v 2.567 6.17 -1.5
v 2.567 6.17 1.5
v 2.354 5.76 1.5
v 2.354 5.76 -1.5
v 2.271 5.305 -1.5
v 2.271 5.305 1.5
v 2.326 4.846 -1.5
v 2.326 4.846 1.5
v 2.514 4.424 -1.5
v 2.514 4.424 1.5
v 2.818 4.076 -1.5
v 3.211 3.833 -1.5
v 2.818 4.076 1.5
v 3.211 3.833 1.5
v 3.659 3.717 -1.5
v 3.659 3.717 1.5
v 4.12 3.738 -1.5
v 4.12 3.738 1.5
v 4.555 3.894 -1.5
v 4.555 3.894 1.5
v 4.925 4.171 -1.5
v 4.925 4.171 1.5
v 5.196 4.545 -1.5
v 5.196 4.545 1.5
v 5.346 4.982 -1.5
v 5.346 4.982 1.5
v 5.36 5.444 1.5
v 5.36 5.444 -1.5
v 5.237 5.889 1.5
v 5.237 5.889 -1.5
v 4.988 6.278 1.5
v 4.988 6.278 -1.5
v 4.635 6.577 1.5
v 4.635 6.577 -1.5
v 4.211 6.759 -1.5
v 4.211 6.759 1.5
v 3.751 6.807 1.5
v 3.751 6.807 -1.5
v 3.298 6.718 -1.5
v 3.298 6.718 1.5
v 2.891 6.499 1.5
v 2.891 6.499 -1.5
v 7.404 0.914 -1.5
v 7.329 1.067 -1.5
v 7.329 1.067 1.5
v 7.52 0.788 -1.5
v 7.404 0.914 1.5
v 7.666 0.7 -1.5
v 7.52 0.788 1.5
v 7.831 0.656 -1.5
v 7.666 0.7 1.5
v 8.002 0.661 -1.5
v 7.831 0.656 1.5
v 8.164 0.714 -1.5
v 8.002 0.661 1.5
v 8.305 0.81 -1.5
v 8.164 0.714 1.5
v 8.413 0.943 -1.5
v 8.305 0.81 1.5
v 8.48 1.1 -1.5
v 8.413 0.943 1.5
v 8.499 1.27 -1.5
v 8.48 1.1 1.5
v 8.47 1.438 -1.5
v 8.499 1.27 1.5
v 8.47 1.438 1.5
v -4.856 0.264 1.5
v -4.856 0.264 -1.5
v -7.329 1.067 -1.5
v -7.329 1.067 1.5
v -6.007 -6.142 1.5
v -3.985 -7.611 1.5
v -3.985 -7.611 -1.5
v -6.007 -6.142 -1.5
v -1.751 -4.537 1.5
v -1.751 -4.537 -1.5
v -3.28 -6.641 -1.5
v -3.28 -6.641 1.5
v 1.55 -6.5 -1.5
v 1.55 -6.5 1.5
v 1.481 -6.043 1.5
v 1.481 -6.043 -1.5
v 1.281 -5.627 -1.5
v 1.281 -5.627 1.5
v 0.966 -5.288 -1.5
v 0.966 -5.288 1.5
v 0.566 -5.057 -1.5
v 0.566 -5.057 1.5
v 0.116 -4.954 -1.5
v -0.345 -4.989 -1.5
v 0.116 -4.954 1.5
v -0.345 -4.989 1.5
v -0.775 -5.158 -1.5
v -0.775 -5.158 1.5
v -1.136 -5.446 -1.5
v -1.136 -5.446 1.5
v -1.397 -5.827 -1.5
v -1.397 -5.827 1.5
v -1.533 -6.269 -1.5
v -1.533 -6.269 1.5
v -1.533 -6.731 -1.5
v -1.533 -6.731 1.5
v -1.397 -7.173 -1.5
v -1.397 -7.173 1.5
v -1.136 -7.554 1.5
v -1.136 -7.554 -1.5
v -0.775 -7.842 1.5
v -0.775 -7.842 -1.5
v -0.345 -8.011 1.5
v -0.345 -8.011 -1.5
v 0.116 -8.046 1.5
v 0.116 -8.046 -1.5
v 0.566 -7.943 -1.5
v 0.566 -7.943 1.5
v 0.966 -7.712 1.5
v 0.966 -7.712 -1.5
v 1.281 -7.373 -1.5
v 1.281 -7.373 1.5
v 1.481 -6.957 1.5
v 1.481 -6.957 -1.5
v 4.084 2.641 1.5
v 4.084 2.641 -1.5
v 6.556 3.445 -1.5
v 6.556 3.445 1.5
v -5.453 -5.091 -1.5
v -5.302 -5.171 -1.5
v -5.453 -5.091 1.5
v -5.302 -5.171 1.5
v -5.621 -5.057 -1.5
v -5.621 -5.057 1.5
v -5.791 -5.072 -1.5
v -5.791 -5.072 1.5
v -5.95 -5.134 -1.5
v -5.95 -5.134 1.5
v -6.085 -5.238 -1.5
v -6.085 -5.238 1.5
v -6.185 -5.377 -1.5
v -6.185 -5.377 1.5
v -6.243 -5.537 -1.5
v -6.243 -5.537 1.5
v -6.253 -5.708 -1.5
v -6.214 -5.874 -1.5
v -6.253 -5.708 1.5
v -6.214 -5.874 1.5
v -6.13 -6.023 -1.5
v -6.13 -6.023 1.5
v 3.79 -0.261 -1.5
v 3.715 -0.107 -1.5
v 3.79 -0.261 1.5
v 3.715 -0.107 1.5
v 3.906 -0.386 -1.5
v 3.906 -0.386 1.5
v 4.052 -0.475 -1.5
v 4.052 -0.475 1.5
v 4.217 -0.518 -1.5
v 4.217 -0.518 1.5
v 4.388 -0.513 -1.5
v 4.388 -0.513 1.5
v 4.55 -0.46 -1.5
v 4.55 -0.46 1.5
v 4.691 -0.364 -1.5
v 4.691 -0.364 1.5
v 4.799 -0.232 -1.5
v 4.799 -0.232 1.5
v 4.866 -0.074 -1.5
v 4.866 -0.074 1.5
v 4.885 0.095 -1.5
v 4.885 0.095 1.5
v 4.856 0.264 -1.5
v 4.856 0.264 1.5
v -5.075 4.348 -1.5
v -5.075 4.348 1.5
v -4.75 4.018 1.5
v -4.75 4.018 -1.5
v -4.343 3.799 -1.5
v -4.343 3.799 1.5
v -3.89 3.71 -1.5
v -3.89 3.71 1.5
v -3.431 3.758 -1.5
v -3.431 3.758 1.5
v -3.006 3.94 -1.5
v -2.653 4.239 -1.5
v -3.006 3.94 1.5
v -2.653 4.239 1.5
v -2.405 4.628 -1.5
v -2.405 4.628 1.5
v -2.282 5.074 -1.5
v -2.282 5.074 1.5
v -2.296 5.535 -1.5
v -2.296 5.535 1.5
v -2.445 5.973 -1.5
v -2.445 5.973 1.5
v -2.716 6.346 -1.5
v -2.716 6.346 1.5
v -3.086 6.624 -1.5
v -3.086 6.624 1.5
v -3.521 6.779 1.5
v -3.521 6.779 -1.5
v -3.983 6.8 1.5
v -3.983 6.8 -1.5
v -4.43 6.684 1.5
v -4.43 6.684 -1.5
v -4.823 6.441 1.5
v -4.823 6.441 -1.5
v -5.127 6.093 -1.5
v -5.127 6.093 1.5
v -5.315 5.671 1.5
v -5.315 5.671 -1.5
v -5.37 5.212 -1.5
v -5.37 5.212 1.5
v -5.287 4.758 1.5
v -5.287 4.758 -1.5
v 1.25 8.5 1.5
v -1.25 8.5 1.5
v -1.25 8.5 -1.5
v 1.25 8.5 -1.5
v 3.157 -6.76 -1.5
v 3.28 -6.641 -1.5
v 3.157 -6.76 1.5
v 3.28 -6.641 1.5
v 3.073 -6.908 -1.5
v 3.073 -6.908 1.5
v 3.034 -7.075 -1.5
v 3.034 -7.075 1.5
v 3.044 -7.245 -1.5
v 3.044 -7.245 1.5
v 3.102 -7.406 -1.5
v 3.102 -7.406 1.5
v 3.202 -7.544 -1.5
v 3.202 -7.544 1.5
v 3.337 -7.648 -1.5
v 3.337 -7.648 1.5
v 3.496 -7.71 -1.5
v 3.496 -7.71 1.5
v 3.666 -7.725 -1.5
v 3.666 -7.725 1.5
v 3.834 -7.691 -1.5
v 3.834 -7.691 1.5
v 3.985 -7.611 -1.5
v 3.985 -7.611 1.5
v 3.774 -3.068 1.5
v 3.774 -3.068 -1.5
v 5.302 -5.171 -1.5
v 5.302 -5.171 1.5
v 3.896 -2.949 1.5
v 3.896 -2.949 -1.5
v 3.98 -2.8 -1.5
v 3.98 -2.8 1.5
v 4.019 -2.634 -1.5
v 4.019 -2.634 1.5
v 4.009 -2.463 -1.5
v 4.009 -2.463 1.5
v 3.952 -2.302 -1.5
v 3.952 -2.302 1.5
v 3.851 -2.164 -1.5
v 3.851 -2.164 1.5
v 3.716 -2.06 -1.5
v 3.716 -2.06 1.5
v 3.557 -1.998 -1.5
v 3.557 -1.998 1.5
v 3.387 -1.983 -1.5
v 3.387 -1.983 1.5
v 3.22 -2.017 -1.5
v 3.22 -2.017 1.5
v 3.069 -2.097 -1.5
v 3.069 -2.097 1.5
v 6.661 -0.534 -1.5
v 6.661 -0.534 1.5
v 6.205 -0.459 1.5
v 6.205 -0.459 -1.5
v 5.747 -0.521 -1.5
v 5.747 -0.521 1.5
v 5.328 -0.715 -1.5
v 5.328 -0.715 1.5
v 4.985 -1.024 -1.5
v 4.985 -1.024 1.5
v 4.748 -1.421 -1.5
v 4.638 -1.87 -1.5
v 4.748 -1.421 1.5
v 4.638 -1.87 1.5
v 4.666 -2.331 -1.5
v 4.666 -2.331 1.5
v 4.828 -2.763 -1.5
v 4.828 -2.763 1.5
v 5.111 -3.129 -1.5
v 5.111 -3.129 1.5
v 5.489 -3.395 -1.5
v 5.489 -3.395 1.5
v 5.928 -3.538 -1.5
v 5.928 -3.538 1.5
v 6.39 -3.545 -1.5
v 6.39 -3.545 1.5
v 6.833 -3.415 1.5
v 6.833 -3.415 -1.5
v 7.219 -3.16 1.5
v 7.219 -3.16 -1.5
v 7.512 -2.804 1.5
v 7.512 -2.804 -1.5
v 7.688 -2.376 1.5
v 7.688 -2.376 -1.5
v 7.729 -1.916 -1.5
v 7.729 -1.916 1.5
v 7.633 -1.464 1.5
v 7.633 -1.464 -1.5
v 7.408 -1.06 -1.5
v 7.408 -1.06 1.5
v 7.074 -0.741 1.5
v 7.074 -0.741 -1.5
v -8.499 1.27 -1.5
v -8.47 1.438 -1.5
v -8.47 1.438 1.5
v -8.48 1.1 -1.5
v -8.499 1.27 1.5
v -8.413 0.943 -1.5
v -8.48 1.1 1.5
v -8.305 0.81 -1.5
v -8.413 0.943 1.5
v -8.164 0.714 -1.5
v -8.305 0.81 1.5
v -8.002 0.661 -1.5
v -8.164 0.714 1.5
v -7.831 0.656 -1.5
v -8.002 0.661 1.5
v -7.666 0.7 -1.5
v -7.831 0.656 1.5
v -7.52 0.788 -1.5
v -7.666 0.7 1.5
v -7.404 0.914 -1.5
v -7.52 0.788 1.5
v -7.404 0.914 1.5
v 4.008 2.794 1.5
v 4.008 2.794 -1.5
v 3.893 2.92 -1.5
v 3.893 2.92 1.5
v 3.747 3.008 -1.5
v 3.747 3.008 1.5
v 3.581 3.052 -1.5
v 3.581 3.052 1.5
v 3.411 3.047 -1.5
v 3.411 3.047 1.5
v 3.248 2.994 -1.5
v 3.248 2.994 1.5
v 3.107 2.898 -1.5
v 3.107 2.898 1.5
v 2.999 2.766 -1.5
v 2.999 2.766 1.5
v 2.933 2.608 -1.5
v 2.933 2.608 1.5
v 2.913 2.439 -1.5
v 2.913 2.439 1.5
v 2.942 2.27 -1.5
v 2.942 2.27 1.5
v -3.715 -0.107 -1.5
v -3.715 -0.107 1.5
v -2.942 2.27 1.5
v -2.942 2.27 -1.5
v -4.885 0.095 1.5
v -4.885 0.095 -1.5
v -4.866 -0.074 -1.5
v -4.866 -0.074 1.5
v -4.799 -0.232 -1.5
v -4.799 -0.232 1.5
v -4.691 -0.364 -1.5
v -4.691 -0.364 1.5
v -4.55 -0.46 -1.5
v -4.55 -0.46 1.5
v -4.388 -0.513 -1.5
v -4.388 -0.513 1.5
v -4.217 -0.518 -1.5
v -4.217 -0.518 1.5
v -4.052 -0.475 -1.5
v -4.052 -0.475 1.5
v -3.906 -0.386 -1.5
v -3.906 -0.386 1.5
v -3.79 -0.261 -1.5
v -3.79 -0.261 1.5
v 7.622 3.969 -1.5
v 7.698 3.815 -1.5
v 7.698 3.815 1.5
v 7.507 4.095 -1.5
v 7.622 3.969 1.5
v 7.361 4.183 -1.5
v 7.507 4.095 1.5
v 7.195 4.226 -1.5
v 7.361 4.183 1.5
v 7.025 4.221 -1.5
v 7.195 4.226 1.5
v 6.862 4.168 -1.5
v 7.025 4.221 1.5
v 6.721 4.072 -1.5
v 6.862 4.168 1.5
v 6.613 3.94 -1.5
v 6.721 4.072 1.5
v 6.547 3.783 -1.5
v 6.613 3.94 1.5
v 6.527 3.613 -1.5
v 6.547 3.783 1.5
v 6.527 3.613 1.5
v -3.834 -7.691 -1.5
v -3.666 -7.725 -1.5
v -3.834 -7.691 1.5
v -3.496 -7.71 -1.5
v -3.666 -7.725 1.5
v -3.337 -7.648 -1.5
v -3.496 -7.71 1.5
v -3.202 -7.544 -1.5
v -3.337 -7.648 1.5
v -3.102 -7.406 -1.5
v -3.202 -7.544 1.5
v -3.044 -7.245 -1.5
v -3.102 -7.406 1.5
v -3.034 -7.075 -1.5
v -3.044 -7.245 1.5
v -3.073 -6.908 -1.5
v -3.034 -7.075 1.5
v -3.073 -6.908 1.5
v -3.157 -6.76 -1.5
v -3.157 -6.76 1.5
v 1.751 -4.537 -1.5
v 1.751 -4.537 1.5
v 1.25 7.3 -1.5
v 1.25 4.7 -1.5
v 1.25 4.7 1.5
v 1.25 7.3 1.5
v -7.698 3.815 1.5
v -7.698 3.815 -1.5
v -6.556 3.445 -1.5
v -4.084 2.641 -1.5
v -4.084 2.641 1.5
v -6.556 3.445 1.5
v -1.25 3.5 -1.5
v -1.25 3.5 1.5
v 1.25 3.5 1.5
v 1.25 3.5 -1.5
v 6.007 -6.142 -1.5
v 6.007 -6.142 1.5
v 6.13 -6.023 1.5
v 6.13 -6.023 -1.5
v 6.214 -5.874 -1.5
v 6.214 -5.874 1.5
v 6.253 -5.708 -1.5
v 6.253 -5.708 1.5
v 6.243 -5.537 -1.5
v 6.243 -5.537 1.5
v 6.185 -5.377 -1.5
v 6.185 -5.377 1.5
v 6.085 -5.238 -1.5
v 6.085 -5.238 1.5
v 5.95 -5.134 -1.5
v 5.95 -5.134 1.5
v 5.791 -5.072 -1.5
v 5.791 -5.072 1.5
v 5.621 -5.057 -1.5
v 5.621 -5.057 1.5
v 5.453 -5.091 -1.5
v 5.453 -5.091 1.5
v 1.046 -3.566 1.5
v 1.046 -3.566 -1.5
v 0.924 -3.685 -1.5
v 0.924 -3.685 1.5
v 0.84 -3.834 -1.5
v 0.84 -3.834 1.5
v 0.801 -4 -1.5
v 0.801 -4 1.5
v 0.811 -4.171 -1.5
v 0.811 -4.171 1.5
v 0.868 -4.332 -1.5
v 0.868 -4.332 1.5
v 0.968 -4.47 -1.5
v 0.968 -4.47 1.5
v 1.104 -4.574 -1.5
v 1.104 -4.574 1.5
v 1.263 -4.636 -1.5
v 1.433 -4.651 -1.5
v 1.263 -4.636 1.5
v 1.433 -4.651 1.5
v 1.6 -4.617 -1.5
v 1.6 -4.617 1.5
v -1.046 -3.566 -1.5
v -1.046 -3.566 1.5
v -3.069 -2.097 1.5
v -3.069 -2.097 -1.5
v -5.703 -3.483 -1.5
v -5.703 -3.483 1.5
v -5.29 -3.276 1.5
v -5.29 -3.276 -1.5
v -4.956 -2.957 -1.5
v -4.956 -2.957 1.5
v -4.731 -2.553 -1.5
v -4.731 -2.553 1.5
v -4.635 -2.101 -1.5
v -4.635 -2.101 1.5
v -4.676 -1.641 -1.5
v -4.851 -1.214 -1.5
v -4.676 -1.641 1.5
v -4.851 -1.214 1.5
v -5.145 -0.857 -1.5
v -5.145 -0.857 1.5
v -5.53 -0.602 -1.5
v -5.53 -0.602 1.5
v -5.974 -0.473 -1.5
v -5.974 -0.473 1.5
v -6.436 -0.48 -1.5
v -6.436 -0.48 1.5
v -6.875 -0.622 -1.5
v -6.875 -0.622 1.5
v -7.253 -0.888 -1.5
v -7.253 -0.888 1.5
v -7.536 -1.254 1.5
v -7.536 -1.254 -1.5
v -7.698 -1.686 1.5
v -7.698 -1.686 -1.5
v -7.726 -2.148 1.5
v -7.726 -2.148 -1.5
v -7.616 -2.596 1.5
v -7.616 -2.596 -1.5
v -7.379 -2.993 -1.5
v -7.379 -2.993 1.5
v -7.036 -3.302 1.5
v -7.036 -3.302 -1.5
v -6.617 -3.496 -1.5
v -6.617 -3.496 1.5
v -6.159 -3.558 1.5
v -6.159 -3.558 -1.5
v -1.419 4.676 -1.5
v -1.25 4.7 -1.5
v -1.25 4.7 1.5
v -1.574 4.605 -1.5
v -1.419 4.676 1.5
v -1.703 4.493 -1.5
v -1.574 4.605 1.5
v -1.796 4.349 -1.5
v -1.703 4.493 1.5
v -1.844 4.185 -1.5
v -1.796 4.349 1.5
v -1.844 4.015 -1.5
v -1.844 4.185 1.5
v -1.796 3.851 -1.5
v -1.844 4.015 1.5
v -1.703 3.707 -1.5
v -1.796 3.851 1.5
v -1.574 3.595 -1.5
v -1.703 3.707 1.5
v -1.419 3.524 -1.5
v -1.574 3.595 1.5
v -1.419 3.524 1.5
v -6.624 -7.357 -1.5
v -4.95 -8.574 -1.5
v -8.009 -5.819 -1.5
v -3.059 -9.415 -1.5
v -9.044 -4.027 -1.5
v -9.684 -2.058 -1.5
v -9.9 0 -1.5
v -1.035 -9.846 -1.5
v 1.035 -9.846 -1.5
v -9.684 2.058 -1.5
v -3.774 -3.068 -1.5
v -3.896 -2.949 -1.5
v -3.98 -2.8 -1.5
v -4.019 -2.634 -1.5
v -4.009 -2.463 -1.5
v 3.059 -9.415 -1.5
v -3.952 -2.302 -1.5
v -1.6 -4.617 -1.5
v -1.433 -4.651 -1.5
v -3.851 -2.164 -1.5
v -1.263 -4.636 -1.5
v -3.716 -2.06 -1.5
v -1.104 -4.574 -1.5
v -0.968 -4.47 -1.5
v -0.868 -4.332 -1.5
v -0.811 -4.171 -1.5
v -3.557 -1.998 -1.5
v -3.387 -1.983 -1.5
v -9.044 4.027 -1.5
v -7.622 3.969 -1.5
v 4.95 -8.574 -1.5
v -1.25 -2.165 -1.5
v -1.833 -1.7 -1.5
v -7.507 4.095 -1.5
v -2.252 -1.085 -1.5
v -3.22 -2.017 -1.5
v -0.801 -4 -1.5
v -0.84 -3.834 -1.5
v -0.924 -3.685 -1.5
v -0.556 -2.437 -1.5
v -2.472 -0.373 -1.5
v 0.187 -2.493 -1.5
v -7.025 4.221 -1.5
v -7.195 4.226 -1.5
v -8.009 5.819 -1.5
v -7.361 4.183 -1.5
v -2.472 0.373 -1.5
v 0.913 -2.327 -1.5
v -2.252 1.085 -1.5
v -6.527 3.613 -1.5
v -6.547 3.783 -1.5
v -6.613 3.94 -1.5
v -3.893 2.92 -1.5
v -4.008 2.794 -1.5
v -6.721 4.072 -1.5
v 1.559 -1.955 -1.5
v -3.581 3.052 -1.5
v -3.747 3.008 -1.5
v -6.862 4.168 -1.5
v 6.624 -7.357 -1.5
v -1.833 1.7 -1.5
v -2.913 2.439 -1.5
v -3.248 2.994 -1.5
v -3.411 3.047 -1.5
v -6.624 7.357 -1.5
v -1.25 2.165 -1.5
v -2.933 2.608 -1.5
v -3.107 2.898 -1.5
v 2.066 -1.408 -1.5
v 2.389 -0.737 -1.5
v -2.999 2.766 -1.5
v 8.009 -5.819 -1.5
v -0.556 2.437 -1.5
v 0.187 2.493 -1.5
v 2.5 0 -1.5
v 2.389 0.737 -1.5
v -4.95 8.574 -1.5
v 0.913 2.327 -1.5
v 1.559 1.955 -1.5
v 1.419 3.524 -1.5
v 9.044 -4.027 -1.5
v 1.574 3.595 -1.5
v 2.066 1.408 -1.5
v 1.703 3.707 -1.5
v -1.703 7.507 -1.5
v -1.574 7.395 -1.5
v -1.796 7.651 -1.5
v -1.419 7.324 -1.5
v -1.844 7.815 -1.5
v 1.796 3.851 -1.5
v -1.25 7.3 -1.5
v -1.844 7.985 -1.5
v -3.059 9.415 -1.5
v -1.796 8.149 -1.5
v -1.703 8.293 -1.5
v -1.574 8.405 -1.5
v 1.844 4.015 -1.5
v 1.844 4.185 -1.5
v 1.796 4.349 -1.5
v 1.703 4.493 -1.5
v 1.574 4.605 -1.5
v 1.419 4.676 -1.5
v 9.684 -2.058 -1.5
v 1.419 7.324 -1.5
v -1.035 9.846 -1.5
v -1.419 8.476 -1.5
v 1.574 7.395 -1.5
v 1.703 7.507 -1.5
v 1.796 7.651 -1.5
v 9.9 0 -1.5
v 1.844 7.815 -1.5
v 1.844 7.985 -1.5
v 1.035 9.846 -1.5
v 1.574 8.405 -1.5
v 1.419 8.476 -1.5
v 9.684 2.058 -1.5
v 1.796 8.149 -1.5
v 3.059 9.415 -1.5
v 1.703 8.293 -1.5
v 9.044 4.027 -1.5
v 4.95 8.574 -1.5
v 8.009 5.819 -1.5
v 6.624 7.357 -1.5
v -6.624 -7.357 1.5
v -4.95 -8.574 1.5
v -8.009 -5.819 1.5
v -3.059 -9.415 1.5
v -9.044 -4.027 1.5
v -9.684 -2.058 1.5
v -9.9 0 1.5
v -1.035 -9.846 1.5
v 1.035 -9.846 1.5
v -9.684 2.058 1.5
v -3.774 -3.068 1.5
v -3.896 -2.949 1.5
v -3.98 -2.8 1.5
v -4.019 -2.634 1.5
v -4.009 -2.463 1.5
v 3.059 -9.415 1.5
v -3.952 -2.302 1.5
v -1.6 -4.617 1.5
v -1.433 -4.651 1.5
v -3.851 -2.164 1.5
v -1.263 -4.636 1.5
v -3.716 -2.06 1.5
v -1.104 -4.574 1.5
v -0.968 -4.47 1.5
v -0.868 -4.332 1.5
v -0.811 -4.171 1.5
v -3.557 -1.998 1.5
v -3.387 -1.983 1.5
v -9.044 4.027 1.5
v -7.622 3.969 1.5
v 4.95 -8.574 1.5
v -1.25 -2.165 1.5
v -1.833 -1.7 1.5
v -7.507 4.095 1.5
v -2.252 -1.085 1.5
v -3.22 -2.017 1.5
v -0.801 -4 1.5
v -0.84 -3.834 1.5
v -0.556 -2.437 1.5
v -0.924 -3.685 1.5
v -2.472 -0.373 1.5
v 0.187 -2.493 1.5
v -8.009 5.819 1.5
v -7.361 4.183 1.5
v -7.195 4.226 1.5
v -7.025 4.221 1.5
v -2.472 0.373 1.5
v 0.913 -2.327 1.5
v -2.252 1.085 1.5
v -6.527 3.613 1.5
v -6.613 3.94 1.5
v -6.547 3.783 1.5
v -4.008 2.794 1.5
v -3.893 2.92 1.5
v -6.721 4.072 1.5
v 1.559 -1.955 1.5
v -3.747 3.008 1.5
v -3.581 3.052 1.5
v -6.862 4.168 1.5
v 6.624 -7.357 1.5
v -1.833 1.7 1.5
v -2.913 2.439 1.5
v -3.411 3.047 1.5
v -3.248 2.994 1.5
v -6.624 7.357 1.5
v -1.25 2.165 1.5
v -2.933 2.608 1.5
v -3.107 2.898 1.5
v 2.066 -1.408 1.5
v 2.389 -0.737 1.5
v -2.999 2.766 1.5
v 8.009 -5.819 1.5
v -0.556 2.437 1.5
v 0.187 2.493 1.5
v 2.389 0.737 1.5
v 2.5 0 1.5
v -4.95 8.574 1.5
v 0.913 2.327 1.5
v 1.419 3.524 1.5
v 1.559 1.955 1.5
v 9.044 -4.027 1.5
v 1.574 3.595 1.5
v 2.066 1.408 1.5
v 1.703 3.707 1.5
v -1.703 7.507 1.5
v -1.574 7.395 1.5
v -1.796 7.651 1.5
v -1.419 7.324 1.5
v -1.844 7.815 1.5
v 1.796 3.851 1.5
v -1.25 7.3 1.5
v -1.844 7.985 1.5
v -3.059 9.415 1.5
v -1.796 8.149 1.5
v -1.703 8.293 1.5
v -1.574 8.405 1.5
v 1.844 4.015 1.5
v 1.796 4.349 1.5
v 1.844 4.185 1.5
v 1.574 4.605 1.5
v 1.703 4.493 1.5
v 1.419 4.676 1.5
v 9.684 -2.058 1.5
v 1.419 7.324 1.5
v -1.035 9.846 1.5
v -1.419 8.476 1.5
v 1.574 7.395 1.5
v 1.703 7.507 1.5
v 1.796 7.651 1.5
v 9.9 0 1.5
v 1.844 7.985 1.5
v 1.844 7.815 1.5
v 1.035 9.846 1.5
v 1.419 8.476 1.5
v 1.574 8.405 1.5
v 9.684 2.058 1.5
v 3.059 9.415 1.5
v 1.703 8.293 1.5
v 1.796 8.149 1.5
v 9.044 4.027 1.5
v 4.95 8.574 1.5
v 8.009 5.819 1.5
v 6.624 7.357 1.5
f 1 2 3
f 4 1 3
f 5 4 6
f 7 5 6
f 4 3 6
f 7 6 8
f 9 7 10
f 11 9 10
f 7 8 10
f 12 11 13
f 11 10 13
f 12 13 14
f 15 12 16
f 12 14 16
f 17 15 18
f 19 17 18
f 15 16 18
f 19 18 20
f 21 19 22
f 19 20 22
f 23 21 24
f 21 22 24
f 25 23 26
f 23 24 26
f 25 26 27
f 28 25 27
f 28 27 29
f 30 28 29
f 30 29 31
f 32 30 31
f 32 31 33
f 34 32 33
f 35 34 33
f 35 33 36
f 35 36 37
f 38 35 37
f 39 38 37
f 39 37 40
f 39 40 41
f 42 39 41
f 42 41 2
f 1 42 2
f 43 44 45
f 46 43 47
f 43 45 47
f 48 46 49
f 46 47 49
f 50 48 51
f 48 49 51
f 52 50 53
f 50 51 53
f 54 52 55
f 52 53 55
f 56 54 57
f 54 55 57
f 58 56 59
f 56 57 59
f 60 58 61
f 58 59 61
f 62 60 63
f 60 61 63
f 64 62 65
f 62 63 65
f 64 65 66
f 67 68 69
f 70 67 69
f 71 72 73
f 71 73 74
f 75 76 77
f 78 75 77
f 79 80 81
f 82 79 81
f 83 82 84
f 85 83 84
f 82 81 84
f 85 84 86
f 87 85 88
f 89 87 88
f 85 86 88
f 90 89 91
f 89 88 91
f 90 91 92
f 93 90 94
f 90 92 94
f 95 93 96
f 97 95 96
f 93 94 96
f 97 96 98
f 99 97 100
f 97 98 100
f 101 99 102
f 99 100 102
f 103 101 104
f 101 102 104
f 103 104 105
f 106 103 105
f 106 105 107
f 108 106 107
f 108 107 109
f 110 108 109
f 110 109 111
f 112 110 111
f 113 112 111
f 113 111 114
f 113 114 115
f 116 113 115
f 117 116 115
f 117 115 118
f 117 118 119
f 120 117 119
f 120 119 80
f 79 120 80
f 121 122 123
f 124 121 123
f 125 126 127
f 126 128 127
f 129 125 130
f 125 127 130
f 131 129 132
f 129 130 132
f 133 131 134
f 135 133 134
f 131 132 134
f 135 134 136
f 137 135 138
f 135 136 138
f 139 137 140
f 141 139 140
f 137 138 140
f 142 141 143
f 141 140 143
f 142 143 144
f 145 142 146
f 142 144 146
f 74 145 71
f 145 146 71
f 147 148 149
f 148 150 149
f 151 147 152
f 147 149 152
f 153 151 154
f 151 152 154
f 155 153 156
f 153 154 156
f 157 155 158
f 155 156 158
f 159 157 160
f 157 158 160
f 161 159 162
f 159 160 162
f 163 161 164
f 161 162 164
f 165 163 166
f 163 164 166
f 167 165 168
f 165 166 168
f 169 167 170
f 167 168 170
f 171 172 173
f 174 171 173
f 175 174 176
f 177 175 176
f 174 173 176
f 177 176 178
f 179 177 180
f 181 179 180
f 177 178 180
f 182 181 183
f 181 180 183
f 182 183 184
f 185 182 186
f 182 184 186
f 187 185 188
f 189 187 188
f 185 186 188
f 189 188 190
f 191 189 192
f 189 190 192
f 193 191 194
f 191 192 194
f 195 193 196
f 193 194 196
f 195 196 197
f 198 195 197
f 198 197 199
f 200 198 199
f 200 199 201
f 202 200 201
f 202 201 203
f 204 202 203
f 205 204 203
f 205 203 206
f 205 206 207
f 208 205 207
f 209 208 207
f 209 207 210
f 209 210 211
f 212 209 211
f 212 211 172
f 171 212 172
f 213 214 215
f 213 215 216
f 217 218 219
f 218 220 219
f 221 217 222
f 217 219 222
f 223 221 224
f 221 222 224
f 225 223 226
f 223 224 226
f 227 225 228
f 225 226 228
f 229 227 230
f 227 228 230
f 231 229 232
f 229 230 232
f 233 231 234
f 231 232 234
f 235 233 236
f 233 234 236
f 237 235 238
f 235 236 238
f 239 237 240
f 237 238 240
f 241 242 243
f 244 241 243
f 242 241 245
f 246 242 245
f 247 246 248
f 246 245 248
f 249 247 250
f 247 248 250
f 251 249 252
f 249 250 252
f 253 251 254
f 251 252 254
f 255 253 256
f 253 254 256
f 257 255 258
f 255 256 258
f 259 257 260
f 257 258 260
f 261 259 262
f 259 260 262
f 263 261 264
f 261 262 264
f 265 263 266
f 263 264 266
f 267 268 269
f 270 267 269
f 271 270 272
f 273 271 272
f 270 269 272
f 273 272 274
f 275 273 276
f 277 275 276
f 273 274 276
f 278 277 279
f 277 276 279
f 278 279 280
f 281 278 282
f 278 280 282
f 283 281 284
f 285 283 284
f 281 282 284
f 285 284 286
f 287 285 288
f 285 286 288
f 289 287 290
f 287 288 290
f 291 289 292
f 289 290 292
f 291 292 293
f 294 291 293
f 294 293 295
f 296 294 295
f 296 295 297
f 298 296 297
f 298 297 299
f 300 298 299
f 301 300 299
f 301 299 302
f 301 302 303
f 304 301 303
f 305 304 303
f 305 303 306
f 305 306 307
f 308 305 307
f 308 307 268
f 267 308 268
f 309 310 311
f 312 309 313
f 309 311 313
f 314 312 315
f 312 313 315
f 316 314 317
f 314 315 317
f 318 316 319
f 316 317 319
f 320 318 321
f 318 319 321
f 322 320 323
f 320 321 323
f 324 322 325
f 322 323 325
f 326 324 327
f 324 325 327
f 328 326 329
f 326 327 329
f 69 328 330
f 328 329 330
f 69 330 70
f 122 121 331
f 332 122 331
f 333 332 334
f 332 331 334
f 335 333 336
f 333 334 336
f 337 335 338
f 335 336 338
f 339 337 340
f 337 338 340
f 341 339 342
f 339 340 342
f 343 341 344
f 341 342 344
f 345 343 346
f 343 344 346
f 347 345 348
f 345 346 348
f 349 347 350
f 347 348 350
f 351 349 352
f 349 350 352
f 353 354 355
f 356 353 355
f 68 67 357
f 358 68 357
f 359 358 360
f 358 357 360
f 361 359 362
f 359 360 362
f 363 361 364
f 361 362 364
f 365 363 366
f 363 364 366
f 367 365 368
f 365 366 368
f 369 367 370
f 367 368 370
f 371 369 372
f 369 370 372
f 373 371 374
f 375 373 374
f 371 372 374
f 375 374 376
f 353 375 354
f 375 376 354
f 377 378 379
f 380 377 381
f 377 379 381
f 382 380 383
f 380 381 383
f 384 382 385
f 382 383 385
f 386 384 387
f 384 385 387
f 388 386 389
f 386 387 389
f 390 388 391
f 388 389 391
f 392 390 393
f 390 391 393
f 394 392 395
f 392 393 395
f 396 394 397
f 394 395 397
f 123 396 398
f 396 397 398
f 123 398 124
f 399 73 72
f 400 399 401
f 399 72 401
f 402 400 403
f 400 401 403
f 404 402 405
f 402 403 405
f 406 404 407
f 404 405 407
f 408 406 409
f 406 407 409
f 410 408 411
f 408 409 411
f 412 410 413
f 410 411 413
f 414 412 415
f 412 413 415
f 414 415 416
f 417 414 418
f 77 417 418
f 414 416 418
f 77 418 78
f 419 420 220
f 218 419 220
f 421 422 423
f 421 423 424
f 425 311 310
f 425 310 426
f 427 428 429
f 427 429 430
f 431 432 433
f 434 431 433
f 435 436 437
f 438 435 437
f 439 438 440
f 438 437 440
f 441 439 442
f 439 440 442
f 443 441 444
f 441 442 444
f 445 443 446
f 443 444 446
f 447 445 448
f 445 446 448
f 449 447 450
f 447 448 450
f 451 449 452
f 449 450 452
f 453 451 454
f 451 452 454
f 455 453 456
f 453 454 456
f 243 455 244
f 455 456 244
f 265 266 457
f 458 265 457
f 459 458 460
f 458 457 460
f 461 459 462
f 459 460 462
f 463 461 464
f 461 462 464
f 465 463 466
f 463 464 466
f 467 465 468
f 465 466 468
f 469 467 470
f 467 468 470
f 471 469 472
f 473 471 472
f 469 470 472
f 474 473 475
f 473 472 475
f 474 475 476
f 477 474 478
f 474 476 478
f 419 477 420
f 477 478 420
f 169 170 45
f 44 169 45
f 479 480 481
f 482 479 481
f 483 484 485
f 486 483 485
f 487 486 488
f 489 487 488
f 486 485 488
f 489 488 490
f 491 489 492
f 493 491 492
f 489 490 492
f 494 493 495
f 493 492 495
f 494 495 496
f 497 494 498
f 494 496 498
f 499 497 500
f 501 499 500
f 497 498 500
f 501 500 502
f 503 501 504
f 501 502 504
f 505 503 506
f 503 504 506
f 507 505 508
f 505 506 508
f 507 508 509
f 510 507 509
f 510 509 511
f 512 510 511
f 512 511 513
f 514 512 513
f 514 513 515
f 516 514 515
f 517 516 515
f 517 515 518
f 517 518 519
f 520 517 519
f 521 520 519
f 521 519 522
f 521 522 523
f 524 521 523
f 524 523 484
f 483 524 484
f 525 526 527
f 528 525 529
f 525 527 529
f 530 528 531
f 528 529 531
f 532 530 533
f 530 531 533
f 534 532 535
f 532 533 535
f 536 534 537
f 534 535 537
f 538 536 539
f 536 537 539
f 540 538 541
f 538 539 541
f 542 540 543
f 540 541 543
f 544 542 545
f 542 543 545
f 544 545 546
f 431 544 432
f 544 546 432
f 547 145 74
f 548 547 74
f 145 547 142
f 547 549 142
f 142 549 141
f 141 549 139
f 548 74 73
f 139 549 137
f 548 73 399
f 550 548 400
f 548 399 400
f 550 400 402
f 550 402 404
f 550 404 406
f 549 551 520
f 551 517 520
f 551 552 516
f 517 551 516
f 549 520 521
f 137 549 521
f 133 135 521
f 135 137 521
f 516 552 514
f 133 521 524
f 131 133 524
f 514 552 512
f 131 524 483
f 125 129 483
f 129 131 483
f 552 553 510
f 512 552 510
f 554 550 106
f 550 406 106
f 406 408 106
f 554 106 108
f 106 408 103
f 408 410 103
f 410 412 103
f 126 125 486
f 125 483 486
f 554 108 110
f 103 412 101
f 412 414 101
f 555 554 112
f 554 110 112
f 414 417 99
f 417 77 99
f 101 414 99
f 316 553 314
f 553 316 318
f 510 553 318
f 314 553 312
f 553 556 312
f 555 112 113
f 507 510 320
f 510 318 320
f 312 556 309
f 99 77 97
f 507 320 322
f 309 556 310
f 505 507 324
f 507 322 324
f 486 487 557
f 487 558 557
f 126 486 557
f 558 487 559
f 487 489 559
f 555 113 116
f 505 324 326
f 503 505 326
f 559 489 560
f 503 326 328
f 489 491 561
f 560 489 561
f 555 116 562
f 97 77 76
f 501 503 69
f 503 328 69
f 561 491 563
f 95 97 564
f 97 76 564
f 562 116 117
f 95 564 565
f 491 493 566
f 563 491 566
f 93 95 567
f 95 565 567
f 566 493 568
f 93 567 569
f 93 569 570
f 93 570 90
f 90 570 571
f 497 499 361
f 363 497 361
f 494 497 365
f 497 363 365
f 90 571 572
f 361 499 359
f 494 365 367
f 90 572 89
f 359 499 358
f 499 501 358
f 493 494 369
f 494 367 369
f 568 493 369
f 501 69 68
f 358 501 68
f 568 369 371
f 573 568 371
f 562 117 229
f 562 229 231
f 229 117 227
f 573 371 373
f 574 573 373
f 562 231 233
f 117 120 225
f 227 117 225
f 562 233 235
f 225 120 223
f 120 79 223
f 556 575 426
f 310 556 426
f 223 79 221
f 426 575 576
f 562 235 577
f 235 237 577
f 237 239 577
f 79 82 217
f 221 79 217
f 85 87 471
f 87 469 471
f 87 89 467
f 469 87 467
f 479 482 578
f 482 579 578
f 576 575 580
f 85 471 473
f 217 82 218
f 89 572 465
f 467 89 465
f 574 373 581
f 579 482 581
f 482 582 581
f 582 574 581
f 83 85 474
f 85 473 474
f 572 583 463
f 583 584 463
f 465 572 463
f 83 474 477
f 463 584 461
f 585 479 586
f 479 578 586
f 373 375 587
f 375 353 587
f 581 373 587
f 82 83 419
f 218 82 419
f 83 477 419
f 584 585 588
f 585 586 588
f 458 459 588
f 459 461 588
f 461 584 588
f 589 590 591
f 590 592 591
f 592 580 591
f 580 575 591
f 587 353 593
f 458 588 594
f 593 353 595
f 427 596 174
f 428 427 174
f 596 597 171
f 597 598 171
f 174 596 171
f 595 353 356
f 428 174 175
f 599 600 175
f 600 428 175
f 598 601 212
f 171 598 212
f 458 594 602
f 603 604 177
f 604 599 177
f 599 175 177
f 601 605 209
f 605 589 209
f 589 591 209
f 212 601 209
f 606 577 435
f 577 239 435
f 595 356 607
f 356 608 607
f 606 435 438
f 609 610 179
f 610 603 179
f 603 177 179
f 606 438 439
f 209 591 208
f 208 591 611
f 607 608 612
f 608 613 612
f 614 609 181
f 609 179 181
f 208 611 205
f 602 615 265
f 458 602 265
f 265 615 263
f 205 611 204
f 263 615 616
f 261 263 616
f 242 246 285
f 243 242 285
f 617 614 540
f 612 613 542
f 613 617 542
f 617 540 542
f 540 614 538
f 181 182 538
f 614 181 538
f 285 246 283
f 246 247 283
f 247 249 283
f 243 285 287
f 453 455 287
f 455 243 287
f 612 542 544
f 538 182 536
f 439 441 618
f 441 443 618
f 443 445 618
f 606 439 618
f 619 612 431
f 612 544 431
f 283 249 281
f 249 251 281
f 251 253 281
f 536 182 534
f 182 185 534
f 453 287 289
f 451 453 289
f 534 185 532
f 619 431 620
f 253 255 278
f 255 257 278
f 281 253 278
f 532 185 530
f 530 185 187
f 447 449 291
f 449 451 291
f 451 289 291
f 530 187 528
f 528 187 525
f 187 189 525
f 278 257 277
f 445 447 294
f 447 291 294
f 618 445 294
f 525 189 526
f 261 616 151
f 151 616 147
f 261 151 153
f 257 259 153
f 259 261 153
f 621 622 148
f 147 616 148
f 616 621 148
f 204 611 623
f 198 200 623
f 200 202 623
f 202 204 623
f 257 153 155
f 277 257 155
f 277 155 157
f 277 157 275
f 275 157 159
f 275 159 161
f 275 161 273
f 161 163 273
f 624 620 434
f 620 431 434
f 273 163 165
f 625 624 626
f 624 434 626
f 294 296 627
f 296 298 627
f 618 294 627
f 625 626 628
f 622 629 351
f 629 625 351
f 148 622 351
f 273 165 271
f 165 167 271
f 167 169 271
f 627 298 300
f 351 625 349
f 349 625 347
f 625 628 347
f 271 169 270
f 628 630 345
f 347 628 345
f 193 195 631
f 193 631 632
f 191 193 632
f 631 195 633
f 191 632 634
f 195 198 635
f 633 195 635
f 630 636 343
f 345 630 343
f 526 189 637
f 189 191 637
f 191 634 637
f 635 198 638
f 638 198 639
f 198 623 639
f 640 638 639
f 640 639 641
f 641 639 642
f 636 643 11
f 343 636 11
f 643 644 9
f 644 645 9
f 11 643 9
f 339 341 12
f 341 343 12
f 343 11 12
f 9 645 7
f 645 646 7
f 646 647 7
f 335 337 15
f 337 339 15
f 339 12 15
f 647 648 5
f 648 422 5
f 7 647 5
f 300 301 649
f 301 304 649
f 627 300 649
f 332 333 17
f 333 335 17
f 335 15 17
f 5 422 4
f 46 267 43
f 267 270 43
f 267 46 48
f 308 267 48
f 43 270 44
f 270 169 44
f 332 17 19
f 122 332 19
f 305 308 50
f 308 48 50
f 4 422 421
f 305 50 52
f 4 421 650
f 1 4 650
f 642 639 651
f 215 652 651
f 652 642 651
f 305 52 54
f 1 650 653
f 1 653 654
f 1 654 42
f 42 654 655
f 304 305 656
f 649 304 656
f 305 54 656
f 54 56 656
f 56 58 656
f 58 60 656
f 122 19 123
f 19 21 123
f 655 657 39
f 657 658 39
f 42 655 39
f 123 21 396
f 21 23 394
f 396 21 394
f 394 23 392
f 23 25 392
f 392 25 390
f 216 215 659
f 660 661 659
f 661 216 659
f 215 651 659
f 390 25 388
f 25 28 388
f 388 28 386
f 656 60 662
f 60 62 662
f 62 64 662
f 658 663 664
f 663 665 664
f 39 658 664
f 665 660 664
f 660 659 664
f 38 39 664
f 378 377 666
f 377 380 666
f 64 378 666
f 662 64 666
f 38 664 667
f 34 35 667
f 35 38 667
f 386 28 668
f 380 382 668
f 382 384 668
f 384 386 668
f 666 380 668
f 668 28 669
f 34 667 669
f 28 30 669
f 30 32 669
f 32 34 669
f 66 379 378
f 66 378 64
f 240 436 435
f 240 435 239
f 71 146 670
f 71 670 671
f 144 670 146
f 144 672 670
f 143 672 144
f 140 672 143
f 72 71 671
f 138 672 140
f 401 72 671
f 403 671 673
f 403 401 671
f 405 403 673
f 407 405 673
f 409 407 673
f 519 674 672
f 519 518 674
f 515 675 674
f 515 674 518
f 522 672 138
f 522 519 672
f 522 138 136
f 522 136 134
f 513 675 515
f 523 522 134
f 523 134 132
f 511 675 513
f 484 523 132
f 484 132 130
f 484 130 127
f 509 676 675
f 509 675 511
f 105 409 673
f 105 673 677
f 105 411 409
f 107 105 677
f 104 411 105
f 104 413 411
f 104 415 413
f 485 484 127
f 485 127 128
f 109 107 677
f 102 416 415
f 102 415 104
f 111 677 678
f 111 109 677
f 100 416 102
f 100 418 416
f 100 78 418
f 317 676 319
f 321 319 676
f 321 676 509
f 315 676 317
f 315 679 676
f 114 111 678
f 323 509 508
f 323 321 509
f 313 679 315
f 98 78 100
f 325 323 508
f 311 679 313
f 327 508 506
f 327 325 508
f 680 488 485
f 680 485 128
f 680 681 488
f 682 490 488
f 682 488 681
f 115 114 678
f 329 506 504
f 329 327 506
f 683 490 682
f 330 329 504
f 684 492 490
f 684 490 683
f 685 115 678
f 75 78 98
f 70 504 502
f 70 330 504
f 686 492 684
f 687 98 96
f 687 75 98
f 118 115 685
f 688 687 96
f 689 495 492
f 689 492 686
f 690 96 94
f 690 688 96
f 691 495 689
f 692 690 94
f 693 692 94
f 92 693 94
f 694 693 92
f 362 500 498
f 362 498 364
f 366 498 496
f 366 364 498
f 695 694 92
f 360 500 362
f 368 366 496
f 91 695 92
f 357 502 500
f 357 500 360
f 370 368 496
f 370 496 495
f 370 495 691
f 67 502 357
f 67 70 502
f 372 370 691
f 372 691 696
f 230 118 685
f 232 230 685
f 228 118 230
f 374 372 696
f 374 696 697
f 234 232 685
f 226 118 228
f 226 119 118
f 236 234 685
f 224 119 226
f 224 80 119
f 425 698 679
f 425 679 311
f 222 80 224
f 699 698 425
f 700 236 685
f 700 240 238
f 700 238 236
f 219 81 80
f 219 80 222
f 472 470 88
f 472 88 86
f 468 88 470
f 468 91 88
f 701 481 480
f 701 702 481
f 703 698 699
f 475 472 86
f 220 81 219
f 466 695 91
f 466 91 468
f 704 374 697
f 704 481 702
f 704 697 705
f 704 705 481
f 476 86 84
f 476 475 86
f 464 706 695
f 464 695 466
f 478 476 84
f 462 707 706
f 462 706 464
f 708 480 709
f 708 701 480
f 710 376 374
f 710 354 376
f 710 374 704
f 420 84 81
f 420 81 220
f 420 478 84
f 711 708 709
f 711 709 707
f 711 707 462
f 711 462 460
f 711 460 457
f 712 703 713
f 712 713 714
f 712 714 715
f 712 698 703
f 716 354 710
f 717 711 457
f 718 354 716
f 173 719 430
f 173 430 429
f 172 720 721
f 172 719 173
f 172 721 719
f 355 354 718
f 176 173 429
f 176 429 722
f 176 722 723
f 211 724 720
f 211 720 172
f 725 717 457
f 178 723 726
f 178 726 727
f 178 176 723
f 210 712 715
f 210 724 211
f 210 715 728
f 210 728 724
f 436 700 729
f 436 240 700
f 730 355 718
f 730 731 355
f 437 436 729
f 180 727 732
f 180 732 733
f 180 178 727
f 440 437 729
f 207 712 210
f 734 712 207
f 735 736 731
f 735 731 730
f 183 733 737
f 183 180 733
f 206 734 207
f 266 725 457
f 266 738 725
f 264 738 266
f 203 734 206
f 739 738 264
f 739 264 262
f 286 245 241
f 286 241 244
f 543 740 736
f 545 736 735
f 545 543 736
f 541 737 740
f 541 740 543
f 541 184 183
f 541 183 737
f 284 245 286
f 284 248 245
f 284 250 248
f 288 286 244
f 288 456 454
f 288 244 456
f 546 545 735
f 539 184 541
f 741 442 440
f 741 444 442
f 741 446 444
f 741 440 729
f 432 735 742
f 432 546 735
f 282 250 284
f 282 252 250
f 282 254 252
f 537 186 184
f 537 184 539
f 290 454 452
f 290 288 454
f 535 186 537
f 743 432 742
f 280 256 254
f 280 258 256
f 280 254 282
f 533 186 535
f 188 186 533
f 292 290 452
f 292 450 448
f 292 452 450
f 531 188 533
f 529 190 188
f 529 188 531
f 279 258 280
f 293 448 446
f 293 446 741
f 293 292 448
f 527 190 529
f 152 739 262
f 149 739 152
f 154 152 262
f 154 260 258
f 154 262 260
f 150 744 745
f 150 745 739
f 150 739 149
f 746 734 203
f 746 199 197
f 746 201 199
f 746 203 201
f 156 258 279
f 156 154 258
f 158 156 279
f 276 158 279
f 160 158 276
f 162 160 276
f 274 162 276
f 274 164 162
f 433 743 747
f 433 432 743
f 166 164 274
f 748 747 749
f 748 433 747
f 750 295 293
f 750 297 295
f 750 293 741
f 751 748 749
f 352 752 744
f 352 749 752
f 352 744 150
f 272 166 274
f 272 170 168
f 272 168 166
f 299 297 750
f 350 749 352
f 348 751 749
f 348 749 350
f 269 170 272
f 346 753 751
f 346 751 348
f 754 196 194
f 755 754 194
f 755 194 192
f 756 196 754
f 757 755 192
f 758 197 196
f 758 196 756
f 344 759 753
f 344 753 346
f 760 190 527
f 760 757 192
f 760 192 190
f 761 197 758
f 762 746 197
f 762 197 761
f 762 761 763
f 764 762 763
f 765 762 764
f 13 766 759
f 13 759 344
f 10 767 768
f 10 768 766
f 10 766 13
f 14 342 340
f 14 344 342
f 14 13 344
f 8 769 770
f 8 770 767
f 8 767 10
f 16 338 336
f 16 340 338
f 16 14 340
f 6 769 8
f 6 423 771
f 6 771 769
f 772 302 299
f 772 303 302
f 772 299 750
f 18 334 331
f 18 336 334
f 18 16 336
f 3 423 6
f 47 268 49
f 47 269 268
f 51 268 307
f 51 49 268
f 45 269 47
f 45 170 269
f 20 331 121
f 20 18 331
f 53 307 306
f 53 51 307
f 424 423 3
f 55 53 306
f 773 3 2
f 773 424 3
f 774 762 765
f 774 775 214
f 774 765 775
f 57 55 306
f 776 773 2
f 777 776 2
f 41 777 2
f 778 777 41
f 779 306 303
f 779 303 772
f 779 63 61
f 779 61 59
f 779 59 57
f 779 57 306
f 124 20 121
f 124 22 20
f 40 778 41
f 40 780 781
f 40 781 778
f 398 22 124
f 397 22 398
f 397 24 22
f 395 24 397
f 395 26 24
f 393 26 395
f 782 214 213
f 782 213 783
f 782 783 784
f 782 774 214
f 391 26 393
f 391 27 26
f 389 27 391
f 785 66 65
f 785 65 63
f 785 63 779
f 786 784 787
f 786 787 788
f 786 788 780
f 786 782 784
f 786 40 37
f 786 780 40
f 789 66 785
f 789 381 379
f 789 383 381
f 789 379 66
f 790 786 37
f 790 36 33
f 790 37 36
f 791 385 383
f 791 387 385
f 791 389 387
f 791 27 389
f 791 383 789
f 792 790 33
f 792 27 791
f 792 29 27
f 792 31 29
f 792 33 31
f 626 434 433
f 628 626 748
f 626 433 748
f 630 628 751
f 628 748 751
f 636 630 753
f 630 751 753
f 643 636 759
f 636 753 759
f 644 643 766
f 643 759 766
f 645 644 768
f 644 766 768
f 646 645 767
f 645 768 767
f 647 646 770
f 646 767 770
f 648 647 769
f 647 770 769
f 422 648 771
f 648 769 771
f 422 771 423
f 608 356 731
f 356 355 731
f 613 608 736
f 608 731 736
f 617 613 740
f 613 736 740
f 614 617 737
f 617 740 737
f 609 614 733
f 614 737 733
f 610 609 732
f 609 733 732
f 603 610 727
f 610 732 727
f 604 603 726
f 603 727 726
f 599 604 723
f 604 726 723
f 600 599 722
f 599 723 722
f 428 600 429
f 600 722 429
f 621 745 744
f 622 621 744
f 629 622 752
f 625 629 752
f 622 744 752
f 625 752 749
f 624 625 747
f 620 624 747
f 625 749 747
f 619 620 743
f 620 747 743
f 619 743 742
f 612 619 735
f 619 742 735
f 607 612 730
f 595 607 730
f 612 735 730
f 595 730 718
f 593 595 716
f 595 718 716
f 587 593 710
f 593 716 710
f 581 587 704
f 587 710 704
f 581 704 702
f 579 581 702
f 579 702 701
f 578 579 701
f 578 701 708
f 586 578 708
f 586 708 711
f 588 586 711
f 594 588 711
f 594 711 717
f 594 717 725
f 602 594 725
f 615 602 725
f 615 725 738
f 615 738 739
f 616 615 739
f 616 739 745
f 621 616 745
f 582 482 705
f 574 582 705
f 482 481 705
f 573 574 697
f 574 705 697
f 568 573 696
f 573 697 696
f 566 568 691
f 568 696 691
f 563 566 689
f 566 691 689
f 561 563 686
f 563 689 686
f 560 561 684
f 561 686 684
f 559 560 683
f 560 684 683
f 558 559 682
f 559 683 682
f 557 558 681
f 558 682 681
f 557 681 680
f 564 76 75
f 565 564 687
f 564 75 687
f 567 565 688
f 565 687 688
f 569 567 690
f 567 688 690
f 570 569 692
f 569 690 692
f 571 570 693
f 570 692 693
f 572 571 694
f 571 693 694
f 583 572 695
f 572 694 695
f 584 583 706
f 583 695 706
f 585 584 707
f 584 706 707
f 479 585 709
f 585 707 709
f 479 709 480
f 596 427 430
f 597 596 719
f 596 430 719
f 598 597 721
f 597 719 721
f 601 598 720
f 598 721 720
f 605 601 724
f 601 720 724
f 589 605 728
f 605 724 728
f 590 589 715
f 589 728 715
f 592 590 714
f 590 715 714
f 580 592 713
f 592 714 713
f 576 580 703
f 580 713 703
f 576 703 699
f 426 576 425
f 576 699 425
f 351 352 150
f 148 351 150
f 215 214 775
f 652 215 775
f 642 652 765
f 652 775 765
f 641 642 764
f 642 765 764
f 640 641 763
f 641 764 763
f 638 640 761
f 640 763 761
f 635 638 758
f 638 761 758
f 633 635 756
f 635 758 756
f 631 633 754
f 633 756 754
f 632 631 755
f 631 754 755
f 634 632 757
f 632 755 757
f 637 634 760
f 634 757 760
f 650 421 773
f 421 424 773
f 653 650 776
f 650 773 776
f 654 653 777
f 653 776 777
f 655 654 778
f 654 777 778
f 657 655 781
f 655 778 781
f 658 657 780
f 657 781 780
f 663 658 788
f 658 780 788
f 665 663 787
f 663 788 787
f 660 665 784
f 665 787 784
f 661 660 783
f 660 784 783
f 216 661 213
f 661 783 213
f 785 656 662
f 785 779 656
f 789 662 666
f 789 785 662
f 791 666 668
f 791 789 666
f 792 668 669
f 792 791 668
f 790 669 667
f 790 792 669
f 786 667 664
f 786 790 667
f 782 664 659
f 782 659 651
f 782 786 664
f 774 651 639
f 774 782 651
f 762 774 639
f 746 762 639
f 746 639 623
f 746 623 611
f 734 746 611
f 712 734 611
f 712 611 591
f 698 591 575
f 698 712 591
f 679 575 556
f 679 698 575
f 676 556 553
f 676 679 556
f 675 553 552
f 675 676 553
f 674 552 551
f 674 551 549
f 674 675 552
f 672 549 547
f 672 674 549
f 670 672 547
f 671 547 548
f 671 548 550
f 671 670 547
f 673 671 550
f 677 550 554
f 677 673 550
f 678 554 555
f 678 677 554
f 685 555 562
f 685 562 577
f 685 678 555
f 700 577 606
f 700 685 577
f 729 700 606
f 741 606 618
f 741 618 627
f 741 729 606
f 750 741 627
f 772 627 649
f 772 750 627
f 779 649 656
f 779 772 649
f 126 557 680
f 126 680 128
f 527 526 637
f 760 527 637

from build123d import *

# Parameters (mm, degrees)
SKETCH_1_R               = 9.9
EXTRUDE_1_DEPTH          = 1.5
SKETCH_2_R               = 1.55
SKETCH_2_W               = 2.5
SKETCH_2_H               = 5
CUT_EXTRUDE_1_DEPTH      = 4
PATTERN_CIRCULAR_1_COUNT = 5
SKETCH_3_R               = 0.6
CUT_EXTRUDE_2_DEPTH      = 4
PATTERN_CIRCULAR_2_COUNT = 5
SKETCH_4_R               = 2.5
CUT_EXTRUDE_3_DEPTH      = 4


with BuildPart() as part:
    # 草图1 → 凸台-拉伸1 (new body, symmetric)
    with BuildSketch(Plane.XY):
        Circle(SKETCH_1_R)
    extrude(amount=EXTRUDE_1_DEPTH, both=True)

    # 草图2 → 切除-拉伸1 (cut, through all)
    with BuildSketch(Plane.XY.offset(1.5)):
        with Locations((0, -6.5)):
            Circle(SKETCH_2_R)
        with Locations((0, 6)):
            Rectangle(SKETCH_2_W, SKETCH_2_H)
    cut_extrude_1 = extrude(amount=-CUT_EXTRUDE_1_DEPTH, mode=Mode.SUBTRACT)

    # 阵列(圆周)1: 切除-拉伸1 ×5 about axis
    pattern_circular_1_axis = Axis((0, 0, 0), (0, 0, 1))
    for i in range(1, PATTERN_CIRCULAR_1_COUNT):
        add(cut_extrude_1.rotate(pattern_circular_1_axis, i * 360 / PATTERN_CIRCULAR_1_COUNT), mode=Mode.SUBTRACT)

    # 草图3 → 切除-拉伸2 (cut, through all)
    with BuildSketch(Plane.XY.offset(1.5)):
        with Locations((1.25, 7.9)):
            Circle(SKETCH_3_R)
        with Locations((-1.25, 7.9)):
            Circle(SKETCH_3_R)
        with Locations((-1.25, 4.1)):
            Circle(SKETCH_3_R)
        with Locations((1.25, 4.1)):
            Circle(SKETCH_3_R)
    cut_extrude_2 = extrude(amount=-CUT_EXTRUDE_2_DEPTH, mode=Mode.SUBTRACT)

    # 阵列(圆周)2: 切除-拉伸2 ×5 about axis
    pattern_circular_2_axis = Axis((0, 0, 0), (0, 0, 1))
    for i in range(1, PATTERN_CIRCULAR_2_COUNT):
        add(cut_extrude_2.rotate(pattern_circular_2_axis, i * 360 / PATTERN_CIRCULAR_2_COUNT), mode=Mode.SUBTRACT)

    # 草图4 → 切除-拉伸3 (cut, through all)
    with BuildSketch(Plane.XY.offset(1.5)):
        Circle(SKETCH_4_R)
    extrude(amount=-CUT_EXTRUDE_3_DEPTH, mode=Mode.SUBTRACT)


solid = part.part
